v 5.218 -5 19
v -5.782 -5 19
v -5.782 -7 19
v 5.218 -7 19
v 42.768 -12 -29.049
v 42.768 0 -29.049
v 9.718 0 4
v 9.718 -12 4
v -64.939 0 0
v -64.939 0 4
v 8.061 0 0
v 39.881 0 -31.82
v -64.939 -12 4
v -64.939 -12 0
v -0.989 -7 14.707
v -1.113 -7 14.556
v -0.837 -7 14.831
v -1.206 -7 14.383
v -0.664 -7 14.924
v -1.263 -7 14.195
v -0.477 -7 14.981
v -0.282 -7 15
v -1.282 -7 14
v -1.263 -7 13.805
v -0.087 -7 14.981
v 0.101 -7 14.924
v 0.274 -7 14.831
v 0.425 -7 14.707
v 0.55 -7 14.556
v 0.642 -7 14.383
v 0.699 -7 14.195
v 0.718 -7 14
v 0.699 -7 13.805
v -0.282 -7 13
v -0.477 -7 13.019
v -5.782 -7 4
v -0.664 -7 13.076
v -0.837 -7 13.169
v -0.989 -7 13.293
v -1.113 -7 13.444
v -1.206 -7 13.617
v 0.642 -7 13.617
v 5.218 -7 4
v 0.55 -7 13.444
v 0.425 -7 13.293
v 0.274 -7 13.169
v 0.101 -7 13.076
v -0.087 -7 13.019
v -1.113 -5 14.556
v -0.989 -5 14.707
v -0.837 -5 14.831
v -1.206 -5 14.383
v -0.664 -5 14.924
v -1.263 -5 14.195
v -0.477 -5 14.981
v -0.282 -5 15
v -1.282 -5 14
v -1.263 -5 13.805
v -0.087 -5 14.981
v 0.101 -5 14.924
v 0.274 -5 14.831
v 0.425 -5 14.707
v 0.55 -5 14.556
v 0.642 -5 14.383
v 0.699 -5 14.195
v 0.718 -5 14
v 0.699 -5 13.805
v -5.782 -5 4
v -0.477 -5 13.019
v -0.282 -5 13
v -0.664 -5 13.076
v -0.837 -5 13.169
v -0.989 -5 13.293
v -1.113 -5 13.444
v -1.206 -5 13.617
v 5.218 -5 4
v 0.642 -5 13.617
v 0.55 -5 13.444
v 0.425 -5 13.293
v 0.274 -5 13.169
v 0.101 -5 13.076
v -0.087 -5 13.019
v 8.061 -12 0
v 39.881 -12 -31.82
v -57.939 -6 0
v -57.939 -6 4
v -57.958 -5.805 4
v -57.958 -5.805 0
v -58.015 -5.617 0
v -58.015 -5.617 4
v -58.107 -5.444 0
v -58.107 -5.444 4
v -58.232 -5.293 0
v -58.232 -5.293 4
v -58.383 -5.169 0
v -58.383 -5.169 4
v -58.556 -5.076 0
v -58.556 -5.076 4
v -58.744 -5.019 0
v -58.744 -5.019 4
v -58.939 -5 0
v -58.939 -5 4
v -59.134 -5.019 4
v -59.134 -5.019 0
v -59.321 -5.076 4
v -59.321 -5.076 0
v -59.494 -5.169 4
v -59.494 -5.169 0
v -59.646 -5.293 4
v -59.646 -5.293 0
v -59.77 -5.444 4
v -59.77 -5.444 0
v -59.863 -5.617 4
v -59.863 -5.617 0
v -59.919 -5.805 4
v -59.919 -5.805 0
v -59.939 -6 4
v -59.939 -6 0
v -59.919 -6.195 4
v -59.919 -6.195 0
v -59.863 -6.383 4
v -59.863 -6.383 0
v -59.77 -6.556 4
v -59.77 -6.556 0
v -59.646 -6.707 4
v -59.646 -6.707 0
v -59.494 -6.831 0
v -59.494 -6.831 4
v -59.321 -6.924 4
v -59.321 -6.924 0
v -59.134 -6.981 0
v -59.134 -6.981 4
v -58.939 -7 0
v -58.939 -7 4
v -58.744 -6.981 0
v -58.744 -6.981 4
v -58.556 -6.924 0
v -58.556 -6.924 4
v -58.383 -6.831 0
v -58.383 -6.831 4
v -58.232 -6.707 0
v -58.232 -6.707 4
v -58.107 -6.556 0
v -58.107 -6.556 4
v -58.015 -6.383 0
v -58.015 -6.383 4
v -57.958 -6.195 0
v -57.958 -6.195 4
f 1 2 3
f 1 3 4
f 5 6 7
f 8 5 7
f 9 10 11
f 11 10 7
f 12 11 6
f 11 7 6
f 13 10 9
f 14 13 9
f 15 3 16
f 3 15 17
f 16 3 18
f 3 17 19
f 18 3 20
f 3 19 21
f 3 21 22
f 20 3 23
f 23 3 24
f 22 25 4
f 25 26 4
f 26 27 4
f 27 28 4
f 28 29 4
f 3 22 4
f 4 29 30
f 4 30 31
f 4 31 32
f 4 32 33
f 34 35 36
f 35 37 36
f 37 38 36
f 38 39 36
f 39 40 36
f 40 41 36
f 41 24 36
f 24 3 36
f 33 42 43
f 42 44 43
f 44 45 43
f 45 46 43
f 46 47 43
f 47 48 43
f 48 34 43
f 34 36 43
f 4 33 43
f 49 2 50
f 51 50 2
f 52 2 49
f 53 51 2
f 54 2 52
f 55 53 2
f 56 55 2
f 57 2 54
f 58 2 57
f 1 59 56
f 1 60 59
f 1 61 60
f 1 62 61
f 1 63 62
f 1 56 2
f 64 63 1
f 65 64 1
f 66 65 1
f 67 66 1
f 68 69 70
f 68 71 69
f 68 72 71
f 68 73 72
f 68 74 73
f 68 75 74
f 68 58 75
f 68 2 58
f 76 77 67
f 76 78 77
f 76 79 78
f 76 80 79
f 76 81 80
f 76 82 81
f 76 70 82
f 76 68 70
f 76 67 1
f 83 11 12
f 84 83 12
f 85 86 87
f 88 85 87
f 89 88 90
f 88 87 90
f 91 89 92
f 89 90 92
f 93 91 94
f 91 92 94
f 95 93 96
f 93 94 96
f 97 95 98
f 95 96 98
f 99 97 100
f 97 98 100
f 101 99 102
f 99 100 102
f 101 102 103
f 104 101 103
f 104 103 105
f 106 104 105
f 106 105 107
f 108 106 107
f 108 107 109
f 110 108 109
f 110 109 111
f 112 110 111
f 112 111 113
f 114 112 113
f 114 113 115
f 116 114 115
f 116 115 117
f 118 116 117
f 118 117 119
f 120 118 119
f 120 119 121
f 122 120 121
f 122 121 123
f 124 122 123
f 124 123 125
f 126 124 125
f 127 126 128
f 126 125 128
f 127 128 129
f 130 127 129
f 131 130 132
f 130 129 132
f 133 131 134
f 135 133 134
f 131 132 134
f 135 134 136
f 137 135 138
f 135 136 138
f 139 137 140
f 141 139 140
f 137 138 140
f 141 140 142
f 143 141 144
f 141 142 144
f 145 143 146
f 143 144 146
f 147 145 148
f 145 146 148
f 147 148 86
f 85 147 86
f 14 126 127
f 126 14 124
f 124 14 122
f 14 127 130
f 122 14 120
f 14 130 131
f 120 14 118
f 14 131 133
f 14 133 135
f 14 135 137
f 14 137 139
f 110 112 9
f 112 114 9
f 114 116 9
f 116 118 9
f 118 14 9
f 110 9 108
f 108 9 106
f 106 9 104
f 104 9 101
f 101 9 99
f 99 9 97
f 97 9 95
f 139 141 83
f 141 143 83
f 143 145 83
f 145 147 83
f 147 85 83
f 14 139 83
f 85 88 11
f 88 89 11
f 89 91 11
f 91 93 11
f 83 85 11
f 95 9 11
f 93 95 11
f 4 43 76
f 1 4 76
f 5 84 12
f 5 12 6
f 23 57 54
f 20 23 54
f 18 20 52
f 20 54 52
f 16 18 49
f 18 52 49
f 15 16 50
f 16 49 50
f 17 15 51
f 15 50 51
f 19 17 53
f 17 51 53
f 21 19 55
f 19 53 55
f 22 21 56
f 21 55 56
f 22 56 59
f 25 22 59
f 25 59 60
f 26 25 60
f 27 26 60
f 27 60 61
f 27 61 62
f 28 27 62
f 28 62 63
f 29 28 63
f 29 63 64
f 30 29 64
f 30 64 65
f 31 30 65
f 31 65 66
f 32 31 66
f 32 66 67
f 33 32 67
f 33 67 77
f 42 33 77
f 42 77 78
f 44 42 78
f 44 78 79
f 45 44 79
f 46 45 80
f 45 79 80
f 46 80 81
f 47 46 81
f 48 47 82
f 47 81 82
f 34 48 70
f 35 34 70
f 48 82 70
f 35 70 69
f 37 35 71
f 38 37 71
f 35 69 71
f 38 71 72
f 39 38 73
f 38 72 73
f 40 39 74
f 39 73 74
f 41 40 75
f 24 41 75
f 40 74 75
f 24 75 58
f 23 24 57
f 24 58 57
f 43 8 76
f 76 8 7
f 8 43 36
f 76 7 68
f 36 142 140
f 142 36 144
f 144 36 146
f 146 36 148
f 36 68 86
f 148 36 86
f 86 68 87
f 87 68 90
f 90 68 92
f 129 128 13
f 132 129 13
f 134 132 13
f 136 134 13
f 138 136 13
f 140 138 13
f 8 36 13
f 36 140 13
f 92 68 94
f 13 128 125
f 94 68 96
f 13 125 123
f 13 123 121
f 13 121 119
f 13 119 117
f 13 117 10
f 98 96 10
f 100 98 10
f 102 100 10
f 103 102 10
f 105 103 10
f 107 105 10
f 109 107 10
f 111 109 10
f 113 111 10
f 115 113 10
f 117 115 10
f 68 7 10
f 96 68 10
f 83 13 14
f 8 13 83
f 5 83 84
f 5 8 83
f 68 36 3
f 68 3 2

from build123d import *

# Parameters (mm, degrees)
F1_DEPTH = 12
F2_W     = 11
F2_H     = 2
F3_DEPTH = 15
F4_R     = 1
F5_DEPTH = 7.001
F6_R     = 1
F7_DEPTH = 35.820805


with BuildPart() as f1:
    # F0 (on Front) → F1 (new body)
    with BuildSketch(Plane.XZ):
        Polygon((-64.93865, 4), (-64.93865, 0), (8.06135, 0), (39.881155, -31.819805), (42.7677, -29.049495), (9.718204, 4), align=None)
    extrude(amount=F1_DEPTH)

    # F2 (on face) → F3 (join)
    with BuildSketch(Plane.XY.offset(4)):
        with Locations((-0.281796, -6)):
            Rectangle(F2_W, F2_H)
    extrude(amount=F3_DEPTH)

    # F4 (on face) → F5 (cut, through all)
    with BuildSketch(Plane(origin=(0, -5, 0), x_dir=(-1, 0, 0), z_dir=(0, 1, 0))):
        with Locations((0.281796, 14)):
            Circle(F4_R)
    extrude(amount=-F5_DEPTH, mode=Mode.SUBTRACT)

    # F6 (on face) → F7 (cut, through all)
    with BuildSketch(Plane.XY.offset(4)):
        with Locations((-58.93865, -6)):
            Circle(F6_R)
    extrude(amount=-F7_DEPTH, mode=Mode.SUBTRACT)


solid = f1.part
